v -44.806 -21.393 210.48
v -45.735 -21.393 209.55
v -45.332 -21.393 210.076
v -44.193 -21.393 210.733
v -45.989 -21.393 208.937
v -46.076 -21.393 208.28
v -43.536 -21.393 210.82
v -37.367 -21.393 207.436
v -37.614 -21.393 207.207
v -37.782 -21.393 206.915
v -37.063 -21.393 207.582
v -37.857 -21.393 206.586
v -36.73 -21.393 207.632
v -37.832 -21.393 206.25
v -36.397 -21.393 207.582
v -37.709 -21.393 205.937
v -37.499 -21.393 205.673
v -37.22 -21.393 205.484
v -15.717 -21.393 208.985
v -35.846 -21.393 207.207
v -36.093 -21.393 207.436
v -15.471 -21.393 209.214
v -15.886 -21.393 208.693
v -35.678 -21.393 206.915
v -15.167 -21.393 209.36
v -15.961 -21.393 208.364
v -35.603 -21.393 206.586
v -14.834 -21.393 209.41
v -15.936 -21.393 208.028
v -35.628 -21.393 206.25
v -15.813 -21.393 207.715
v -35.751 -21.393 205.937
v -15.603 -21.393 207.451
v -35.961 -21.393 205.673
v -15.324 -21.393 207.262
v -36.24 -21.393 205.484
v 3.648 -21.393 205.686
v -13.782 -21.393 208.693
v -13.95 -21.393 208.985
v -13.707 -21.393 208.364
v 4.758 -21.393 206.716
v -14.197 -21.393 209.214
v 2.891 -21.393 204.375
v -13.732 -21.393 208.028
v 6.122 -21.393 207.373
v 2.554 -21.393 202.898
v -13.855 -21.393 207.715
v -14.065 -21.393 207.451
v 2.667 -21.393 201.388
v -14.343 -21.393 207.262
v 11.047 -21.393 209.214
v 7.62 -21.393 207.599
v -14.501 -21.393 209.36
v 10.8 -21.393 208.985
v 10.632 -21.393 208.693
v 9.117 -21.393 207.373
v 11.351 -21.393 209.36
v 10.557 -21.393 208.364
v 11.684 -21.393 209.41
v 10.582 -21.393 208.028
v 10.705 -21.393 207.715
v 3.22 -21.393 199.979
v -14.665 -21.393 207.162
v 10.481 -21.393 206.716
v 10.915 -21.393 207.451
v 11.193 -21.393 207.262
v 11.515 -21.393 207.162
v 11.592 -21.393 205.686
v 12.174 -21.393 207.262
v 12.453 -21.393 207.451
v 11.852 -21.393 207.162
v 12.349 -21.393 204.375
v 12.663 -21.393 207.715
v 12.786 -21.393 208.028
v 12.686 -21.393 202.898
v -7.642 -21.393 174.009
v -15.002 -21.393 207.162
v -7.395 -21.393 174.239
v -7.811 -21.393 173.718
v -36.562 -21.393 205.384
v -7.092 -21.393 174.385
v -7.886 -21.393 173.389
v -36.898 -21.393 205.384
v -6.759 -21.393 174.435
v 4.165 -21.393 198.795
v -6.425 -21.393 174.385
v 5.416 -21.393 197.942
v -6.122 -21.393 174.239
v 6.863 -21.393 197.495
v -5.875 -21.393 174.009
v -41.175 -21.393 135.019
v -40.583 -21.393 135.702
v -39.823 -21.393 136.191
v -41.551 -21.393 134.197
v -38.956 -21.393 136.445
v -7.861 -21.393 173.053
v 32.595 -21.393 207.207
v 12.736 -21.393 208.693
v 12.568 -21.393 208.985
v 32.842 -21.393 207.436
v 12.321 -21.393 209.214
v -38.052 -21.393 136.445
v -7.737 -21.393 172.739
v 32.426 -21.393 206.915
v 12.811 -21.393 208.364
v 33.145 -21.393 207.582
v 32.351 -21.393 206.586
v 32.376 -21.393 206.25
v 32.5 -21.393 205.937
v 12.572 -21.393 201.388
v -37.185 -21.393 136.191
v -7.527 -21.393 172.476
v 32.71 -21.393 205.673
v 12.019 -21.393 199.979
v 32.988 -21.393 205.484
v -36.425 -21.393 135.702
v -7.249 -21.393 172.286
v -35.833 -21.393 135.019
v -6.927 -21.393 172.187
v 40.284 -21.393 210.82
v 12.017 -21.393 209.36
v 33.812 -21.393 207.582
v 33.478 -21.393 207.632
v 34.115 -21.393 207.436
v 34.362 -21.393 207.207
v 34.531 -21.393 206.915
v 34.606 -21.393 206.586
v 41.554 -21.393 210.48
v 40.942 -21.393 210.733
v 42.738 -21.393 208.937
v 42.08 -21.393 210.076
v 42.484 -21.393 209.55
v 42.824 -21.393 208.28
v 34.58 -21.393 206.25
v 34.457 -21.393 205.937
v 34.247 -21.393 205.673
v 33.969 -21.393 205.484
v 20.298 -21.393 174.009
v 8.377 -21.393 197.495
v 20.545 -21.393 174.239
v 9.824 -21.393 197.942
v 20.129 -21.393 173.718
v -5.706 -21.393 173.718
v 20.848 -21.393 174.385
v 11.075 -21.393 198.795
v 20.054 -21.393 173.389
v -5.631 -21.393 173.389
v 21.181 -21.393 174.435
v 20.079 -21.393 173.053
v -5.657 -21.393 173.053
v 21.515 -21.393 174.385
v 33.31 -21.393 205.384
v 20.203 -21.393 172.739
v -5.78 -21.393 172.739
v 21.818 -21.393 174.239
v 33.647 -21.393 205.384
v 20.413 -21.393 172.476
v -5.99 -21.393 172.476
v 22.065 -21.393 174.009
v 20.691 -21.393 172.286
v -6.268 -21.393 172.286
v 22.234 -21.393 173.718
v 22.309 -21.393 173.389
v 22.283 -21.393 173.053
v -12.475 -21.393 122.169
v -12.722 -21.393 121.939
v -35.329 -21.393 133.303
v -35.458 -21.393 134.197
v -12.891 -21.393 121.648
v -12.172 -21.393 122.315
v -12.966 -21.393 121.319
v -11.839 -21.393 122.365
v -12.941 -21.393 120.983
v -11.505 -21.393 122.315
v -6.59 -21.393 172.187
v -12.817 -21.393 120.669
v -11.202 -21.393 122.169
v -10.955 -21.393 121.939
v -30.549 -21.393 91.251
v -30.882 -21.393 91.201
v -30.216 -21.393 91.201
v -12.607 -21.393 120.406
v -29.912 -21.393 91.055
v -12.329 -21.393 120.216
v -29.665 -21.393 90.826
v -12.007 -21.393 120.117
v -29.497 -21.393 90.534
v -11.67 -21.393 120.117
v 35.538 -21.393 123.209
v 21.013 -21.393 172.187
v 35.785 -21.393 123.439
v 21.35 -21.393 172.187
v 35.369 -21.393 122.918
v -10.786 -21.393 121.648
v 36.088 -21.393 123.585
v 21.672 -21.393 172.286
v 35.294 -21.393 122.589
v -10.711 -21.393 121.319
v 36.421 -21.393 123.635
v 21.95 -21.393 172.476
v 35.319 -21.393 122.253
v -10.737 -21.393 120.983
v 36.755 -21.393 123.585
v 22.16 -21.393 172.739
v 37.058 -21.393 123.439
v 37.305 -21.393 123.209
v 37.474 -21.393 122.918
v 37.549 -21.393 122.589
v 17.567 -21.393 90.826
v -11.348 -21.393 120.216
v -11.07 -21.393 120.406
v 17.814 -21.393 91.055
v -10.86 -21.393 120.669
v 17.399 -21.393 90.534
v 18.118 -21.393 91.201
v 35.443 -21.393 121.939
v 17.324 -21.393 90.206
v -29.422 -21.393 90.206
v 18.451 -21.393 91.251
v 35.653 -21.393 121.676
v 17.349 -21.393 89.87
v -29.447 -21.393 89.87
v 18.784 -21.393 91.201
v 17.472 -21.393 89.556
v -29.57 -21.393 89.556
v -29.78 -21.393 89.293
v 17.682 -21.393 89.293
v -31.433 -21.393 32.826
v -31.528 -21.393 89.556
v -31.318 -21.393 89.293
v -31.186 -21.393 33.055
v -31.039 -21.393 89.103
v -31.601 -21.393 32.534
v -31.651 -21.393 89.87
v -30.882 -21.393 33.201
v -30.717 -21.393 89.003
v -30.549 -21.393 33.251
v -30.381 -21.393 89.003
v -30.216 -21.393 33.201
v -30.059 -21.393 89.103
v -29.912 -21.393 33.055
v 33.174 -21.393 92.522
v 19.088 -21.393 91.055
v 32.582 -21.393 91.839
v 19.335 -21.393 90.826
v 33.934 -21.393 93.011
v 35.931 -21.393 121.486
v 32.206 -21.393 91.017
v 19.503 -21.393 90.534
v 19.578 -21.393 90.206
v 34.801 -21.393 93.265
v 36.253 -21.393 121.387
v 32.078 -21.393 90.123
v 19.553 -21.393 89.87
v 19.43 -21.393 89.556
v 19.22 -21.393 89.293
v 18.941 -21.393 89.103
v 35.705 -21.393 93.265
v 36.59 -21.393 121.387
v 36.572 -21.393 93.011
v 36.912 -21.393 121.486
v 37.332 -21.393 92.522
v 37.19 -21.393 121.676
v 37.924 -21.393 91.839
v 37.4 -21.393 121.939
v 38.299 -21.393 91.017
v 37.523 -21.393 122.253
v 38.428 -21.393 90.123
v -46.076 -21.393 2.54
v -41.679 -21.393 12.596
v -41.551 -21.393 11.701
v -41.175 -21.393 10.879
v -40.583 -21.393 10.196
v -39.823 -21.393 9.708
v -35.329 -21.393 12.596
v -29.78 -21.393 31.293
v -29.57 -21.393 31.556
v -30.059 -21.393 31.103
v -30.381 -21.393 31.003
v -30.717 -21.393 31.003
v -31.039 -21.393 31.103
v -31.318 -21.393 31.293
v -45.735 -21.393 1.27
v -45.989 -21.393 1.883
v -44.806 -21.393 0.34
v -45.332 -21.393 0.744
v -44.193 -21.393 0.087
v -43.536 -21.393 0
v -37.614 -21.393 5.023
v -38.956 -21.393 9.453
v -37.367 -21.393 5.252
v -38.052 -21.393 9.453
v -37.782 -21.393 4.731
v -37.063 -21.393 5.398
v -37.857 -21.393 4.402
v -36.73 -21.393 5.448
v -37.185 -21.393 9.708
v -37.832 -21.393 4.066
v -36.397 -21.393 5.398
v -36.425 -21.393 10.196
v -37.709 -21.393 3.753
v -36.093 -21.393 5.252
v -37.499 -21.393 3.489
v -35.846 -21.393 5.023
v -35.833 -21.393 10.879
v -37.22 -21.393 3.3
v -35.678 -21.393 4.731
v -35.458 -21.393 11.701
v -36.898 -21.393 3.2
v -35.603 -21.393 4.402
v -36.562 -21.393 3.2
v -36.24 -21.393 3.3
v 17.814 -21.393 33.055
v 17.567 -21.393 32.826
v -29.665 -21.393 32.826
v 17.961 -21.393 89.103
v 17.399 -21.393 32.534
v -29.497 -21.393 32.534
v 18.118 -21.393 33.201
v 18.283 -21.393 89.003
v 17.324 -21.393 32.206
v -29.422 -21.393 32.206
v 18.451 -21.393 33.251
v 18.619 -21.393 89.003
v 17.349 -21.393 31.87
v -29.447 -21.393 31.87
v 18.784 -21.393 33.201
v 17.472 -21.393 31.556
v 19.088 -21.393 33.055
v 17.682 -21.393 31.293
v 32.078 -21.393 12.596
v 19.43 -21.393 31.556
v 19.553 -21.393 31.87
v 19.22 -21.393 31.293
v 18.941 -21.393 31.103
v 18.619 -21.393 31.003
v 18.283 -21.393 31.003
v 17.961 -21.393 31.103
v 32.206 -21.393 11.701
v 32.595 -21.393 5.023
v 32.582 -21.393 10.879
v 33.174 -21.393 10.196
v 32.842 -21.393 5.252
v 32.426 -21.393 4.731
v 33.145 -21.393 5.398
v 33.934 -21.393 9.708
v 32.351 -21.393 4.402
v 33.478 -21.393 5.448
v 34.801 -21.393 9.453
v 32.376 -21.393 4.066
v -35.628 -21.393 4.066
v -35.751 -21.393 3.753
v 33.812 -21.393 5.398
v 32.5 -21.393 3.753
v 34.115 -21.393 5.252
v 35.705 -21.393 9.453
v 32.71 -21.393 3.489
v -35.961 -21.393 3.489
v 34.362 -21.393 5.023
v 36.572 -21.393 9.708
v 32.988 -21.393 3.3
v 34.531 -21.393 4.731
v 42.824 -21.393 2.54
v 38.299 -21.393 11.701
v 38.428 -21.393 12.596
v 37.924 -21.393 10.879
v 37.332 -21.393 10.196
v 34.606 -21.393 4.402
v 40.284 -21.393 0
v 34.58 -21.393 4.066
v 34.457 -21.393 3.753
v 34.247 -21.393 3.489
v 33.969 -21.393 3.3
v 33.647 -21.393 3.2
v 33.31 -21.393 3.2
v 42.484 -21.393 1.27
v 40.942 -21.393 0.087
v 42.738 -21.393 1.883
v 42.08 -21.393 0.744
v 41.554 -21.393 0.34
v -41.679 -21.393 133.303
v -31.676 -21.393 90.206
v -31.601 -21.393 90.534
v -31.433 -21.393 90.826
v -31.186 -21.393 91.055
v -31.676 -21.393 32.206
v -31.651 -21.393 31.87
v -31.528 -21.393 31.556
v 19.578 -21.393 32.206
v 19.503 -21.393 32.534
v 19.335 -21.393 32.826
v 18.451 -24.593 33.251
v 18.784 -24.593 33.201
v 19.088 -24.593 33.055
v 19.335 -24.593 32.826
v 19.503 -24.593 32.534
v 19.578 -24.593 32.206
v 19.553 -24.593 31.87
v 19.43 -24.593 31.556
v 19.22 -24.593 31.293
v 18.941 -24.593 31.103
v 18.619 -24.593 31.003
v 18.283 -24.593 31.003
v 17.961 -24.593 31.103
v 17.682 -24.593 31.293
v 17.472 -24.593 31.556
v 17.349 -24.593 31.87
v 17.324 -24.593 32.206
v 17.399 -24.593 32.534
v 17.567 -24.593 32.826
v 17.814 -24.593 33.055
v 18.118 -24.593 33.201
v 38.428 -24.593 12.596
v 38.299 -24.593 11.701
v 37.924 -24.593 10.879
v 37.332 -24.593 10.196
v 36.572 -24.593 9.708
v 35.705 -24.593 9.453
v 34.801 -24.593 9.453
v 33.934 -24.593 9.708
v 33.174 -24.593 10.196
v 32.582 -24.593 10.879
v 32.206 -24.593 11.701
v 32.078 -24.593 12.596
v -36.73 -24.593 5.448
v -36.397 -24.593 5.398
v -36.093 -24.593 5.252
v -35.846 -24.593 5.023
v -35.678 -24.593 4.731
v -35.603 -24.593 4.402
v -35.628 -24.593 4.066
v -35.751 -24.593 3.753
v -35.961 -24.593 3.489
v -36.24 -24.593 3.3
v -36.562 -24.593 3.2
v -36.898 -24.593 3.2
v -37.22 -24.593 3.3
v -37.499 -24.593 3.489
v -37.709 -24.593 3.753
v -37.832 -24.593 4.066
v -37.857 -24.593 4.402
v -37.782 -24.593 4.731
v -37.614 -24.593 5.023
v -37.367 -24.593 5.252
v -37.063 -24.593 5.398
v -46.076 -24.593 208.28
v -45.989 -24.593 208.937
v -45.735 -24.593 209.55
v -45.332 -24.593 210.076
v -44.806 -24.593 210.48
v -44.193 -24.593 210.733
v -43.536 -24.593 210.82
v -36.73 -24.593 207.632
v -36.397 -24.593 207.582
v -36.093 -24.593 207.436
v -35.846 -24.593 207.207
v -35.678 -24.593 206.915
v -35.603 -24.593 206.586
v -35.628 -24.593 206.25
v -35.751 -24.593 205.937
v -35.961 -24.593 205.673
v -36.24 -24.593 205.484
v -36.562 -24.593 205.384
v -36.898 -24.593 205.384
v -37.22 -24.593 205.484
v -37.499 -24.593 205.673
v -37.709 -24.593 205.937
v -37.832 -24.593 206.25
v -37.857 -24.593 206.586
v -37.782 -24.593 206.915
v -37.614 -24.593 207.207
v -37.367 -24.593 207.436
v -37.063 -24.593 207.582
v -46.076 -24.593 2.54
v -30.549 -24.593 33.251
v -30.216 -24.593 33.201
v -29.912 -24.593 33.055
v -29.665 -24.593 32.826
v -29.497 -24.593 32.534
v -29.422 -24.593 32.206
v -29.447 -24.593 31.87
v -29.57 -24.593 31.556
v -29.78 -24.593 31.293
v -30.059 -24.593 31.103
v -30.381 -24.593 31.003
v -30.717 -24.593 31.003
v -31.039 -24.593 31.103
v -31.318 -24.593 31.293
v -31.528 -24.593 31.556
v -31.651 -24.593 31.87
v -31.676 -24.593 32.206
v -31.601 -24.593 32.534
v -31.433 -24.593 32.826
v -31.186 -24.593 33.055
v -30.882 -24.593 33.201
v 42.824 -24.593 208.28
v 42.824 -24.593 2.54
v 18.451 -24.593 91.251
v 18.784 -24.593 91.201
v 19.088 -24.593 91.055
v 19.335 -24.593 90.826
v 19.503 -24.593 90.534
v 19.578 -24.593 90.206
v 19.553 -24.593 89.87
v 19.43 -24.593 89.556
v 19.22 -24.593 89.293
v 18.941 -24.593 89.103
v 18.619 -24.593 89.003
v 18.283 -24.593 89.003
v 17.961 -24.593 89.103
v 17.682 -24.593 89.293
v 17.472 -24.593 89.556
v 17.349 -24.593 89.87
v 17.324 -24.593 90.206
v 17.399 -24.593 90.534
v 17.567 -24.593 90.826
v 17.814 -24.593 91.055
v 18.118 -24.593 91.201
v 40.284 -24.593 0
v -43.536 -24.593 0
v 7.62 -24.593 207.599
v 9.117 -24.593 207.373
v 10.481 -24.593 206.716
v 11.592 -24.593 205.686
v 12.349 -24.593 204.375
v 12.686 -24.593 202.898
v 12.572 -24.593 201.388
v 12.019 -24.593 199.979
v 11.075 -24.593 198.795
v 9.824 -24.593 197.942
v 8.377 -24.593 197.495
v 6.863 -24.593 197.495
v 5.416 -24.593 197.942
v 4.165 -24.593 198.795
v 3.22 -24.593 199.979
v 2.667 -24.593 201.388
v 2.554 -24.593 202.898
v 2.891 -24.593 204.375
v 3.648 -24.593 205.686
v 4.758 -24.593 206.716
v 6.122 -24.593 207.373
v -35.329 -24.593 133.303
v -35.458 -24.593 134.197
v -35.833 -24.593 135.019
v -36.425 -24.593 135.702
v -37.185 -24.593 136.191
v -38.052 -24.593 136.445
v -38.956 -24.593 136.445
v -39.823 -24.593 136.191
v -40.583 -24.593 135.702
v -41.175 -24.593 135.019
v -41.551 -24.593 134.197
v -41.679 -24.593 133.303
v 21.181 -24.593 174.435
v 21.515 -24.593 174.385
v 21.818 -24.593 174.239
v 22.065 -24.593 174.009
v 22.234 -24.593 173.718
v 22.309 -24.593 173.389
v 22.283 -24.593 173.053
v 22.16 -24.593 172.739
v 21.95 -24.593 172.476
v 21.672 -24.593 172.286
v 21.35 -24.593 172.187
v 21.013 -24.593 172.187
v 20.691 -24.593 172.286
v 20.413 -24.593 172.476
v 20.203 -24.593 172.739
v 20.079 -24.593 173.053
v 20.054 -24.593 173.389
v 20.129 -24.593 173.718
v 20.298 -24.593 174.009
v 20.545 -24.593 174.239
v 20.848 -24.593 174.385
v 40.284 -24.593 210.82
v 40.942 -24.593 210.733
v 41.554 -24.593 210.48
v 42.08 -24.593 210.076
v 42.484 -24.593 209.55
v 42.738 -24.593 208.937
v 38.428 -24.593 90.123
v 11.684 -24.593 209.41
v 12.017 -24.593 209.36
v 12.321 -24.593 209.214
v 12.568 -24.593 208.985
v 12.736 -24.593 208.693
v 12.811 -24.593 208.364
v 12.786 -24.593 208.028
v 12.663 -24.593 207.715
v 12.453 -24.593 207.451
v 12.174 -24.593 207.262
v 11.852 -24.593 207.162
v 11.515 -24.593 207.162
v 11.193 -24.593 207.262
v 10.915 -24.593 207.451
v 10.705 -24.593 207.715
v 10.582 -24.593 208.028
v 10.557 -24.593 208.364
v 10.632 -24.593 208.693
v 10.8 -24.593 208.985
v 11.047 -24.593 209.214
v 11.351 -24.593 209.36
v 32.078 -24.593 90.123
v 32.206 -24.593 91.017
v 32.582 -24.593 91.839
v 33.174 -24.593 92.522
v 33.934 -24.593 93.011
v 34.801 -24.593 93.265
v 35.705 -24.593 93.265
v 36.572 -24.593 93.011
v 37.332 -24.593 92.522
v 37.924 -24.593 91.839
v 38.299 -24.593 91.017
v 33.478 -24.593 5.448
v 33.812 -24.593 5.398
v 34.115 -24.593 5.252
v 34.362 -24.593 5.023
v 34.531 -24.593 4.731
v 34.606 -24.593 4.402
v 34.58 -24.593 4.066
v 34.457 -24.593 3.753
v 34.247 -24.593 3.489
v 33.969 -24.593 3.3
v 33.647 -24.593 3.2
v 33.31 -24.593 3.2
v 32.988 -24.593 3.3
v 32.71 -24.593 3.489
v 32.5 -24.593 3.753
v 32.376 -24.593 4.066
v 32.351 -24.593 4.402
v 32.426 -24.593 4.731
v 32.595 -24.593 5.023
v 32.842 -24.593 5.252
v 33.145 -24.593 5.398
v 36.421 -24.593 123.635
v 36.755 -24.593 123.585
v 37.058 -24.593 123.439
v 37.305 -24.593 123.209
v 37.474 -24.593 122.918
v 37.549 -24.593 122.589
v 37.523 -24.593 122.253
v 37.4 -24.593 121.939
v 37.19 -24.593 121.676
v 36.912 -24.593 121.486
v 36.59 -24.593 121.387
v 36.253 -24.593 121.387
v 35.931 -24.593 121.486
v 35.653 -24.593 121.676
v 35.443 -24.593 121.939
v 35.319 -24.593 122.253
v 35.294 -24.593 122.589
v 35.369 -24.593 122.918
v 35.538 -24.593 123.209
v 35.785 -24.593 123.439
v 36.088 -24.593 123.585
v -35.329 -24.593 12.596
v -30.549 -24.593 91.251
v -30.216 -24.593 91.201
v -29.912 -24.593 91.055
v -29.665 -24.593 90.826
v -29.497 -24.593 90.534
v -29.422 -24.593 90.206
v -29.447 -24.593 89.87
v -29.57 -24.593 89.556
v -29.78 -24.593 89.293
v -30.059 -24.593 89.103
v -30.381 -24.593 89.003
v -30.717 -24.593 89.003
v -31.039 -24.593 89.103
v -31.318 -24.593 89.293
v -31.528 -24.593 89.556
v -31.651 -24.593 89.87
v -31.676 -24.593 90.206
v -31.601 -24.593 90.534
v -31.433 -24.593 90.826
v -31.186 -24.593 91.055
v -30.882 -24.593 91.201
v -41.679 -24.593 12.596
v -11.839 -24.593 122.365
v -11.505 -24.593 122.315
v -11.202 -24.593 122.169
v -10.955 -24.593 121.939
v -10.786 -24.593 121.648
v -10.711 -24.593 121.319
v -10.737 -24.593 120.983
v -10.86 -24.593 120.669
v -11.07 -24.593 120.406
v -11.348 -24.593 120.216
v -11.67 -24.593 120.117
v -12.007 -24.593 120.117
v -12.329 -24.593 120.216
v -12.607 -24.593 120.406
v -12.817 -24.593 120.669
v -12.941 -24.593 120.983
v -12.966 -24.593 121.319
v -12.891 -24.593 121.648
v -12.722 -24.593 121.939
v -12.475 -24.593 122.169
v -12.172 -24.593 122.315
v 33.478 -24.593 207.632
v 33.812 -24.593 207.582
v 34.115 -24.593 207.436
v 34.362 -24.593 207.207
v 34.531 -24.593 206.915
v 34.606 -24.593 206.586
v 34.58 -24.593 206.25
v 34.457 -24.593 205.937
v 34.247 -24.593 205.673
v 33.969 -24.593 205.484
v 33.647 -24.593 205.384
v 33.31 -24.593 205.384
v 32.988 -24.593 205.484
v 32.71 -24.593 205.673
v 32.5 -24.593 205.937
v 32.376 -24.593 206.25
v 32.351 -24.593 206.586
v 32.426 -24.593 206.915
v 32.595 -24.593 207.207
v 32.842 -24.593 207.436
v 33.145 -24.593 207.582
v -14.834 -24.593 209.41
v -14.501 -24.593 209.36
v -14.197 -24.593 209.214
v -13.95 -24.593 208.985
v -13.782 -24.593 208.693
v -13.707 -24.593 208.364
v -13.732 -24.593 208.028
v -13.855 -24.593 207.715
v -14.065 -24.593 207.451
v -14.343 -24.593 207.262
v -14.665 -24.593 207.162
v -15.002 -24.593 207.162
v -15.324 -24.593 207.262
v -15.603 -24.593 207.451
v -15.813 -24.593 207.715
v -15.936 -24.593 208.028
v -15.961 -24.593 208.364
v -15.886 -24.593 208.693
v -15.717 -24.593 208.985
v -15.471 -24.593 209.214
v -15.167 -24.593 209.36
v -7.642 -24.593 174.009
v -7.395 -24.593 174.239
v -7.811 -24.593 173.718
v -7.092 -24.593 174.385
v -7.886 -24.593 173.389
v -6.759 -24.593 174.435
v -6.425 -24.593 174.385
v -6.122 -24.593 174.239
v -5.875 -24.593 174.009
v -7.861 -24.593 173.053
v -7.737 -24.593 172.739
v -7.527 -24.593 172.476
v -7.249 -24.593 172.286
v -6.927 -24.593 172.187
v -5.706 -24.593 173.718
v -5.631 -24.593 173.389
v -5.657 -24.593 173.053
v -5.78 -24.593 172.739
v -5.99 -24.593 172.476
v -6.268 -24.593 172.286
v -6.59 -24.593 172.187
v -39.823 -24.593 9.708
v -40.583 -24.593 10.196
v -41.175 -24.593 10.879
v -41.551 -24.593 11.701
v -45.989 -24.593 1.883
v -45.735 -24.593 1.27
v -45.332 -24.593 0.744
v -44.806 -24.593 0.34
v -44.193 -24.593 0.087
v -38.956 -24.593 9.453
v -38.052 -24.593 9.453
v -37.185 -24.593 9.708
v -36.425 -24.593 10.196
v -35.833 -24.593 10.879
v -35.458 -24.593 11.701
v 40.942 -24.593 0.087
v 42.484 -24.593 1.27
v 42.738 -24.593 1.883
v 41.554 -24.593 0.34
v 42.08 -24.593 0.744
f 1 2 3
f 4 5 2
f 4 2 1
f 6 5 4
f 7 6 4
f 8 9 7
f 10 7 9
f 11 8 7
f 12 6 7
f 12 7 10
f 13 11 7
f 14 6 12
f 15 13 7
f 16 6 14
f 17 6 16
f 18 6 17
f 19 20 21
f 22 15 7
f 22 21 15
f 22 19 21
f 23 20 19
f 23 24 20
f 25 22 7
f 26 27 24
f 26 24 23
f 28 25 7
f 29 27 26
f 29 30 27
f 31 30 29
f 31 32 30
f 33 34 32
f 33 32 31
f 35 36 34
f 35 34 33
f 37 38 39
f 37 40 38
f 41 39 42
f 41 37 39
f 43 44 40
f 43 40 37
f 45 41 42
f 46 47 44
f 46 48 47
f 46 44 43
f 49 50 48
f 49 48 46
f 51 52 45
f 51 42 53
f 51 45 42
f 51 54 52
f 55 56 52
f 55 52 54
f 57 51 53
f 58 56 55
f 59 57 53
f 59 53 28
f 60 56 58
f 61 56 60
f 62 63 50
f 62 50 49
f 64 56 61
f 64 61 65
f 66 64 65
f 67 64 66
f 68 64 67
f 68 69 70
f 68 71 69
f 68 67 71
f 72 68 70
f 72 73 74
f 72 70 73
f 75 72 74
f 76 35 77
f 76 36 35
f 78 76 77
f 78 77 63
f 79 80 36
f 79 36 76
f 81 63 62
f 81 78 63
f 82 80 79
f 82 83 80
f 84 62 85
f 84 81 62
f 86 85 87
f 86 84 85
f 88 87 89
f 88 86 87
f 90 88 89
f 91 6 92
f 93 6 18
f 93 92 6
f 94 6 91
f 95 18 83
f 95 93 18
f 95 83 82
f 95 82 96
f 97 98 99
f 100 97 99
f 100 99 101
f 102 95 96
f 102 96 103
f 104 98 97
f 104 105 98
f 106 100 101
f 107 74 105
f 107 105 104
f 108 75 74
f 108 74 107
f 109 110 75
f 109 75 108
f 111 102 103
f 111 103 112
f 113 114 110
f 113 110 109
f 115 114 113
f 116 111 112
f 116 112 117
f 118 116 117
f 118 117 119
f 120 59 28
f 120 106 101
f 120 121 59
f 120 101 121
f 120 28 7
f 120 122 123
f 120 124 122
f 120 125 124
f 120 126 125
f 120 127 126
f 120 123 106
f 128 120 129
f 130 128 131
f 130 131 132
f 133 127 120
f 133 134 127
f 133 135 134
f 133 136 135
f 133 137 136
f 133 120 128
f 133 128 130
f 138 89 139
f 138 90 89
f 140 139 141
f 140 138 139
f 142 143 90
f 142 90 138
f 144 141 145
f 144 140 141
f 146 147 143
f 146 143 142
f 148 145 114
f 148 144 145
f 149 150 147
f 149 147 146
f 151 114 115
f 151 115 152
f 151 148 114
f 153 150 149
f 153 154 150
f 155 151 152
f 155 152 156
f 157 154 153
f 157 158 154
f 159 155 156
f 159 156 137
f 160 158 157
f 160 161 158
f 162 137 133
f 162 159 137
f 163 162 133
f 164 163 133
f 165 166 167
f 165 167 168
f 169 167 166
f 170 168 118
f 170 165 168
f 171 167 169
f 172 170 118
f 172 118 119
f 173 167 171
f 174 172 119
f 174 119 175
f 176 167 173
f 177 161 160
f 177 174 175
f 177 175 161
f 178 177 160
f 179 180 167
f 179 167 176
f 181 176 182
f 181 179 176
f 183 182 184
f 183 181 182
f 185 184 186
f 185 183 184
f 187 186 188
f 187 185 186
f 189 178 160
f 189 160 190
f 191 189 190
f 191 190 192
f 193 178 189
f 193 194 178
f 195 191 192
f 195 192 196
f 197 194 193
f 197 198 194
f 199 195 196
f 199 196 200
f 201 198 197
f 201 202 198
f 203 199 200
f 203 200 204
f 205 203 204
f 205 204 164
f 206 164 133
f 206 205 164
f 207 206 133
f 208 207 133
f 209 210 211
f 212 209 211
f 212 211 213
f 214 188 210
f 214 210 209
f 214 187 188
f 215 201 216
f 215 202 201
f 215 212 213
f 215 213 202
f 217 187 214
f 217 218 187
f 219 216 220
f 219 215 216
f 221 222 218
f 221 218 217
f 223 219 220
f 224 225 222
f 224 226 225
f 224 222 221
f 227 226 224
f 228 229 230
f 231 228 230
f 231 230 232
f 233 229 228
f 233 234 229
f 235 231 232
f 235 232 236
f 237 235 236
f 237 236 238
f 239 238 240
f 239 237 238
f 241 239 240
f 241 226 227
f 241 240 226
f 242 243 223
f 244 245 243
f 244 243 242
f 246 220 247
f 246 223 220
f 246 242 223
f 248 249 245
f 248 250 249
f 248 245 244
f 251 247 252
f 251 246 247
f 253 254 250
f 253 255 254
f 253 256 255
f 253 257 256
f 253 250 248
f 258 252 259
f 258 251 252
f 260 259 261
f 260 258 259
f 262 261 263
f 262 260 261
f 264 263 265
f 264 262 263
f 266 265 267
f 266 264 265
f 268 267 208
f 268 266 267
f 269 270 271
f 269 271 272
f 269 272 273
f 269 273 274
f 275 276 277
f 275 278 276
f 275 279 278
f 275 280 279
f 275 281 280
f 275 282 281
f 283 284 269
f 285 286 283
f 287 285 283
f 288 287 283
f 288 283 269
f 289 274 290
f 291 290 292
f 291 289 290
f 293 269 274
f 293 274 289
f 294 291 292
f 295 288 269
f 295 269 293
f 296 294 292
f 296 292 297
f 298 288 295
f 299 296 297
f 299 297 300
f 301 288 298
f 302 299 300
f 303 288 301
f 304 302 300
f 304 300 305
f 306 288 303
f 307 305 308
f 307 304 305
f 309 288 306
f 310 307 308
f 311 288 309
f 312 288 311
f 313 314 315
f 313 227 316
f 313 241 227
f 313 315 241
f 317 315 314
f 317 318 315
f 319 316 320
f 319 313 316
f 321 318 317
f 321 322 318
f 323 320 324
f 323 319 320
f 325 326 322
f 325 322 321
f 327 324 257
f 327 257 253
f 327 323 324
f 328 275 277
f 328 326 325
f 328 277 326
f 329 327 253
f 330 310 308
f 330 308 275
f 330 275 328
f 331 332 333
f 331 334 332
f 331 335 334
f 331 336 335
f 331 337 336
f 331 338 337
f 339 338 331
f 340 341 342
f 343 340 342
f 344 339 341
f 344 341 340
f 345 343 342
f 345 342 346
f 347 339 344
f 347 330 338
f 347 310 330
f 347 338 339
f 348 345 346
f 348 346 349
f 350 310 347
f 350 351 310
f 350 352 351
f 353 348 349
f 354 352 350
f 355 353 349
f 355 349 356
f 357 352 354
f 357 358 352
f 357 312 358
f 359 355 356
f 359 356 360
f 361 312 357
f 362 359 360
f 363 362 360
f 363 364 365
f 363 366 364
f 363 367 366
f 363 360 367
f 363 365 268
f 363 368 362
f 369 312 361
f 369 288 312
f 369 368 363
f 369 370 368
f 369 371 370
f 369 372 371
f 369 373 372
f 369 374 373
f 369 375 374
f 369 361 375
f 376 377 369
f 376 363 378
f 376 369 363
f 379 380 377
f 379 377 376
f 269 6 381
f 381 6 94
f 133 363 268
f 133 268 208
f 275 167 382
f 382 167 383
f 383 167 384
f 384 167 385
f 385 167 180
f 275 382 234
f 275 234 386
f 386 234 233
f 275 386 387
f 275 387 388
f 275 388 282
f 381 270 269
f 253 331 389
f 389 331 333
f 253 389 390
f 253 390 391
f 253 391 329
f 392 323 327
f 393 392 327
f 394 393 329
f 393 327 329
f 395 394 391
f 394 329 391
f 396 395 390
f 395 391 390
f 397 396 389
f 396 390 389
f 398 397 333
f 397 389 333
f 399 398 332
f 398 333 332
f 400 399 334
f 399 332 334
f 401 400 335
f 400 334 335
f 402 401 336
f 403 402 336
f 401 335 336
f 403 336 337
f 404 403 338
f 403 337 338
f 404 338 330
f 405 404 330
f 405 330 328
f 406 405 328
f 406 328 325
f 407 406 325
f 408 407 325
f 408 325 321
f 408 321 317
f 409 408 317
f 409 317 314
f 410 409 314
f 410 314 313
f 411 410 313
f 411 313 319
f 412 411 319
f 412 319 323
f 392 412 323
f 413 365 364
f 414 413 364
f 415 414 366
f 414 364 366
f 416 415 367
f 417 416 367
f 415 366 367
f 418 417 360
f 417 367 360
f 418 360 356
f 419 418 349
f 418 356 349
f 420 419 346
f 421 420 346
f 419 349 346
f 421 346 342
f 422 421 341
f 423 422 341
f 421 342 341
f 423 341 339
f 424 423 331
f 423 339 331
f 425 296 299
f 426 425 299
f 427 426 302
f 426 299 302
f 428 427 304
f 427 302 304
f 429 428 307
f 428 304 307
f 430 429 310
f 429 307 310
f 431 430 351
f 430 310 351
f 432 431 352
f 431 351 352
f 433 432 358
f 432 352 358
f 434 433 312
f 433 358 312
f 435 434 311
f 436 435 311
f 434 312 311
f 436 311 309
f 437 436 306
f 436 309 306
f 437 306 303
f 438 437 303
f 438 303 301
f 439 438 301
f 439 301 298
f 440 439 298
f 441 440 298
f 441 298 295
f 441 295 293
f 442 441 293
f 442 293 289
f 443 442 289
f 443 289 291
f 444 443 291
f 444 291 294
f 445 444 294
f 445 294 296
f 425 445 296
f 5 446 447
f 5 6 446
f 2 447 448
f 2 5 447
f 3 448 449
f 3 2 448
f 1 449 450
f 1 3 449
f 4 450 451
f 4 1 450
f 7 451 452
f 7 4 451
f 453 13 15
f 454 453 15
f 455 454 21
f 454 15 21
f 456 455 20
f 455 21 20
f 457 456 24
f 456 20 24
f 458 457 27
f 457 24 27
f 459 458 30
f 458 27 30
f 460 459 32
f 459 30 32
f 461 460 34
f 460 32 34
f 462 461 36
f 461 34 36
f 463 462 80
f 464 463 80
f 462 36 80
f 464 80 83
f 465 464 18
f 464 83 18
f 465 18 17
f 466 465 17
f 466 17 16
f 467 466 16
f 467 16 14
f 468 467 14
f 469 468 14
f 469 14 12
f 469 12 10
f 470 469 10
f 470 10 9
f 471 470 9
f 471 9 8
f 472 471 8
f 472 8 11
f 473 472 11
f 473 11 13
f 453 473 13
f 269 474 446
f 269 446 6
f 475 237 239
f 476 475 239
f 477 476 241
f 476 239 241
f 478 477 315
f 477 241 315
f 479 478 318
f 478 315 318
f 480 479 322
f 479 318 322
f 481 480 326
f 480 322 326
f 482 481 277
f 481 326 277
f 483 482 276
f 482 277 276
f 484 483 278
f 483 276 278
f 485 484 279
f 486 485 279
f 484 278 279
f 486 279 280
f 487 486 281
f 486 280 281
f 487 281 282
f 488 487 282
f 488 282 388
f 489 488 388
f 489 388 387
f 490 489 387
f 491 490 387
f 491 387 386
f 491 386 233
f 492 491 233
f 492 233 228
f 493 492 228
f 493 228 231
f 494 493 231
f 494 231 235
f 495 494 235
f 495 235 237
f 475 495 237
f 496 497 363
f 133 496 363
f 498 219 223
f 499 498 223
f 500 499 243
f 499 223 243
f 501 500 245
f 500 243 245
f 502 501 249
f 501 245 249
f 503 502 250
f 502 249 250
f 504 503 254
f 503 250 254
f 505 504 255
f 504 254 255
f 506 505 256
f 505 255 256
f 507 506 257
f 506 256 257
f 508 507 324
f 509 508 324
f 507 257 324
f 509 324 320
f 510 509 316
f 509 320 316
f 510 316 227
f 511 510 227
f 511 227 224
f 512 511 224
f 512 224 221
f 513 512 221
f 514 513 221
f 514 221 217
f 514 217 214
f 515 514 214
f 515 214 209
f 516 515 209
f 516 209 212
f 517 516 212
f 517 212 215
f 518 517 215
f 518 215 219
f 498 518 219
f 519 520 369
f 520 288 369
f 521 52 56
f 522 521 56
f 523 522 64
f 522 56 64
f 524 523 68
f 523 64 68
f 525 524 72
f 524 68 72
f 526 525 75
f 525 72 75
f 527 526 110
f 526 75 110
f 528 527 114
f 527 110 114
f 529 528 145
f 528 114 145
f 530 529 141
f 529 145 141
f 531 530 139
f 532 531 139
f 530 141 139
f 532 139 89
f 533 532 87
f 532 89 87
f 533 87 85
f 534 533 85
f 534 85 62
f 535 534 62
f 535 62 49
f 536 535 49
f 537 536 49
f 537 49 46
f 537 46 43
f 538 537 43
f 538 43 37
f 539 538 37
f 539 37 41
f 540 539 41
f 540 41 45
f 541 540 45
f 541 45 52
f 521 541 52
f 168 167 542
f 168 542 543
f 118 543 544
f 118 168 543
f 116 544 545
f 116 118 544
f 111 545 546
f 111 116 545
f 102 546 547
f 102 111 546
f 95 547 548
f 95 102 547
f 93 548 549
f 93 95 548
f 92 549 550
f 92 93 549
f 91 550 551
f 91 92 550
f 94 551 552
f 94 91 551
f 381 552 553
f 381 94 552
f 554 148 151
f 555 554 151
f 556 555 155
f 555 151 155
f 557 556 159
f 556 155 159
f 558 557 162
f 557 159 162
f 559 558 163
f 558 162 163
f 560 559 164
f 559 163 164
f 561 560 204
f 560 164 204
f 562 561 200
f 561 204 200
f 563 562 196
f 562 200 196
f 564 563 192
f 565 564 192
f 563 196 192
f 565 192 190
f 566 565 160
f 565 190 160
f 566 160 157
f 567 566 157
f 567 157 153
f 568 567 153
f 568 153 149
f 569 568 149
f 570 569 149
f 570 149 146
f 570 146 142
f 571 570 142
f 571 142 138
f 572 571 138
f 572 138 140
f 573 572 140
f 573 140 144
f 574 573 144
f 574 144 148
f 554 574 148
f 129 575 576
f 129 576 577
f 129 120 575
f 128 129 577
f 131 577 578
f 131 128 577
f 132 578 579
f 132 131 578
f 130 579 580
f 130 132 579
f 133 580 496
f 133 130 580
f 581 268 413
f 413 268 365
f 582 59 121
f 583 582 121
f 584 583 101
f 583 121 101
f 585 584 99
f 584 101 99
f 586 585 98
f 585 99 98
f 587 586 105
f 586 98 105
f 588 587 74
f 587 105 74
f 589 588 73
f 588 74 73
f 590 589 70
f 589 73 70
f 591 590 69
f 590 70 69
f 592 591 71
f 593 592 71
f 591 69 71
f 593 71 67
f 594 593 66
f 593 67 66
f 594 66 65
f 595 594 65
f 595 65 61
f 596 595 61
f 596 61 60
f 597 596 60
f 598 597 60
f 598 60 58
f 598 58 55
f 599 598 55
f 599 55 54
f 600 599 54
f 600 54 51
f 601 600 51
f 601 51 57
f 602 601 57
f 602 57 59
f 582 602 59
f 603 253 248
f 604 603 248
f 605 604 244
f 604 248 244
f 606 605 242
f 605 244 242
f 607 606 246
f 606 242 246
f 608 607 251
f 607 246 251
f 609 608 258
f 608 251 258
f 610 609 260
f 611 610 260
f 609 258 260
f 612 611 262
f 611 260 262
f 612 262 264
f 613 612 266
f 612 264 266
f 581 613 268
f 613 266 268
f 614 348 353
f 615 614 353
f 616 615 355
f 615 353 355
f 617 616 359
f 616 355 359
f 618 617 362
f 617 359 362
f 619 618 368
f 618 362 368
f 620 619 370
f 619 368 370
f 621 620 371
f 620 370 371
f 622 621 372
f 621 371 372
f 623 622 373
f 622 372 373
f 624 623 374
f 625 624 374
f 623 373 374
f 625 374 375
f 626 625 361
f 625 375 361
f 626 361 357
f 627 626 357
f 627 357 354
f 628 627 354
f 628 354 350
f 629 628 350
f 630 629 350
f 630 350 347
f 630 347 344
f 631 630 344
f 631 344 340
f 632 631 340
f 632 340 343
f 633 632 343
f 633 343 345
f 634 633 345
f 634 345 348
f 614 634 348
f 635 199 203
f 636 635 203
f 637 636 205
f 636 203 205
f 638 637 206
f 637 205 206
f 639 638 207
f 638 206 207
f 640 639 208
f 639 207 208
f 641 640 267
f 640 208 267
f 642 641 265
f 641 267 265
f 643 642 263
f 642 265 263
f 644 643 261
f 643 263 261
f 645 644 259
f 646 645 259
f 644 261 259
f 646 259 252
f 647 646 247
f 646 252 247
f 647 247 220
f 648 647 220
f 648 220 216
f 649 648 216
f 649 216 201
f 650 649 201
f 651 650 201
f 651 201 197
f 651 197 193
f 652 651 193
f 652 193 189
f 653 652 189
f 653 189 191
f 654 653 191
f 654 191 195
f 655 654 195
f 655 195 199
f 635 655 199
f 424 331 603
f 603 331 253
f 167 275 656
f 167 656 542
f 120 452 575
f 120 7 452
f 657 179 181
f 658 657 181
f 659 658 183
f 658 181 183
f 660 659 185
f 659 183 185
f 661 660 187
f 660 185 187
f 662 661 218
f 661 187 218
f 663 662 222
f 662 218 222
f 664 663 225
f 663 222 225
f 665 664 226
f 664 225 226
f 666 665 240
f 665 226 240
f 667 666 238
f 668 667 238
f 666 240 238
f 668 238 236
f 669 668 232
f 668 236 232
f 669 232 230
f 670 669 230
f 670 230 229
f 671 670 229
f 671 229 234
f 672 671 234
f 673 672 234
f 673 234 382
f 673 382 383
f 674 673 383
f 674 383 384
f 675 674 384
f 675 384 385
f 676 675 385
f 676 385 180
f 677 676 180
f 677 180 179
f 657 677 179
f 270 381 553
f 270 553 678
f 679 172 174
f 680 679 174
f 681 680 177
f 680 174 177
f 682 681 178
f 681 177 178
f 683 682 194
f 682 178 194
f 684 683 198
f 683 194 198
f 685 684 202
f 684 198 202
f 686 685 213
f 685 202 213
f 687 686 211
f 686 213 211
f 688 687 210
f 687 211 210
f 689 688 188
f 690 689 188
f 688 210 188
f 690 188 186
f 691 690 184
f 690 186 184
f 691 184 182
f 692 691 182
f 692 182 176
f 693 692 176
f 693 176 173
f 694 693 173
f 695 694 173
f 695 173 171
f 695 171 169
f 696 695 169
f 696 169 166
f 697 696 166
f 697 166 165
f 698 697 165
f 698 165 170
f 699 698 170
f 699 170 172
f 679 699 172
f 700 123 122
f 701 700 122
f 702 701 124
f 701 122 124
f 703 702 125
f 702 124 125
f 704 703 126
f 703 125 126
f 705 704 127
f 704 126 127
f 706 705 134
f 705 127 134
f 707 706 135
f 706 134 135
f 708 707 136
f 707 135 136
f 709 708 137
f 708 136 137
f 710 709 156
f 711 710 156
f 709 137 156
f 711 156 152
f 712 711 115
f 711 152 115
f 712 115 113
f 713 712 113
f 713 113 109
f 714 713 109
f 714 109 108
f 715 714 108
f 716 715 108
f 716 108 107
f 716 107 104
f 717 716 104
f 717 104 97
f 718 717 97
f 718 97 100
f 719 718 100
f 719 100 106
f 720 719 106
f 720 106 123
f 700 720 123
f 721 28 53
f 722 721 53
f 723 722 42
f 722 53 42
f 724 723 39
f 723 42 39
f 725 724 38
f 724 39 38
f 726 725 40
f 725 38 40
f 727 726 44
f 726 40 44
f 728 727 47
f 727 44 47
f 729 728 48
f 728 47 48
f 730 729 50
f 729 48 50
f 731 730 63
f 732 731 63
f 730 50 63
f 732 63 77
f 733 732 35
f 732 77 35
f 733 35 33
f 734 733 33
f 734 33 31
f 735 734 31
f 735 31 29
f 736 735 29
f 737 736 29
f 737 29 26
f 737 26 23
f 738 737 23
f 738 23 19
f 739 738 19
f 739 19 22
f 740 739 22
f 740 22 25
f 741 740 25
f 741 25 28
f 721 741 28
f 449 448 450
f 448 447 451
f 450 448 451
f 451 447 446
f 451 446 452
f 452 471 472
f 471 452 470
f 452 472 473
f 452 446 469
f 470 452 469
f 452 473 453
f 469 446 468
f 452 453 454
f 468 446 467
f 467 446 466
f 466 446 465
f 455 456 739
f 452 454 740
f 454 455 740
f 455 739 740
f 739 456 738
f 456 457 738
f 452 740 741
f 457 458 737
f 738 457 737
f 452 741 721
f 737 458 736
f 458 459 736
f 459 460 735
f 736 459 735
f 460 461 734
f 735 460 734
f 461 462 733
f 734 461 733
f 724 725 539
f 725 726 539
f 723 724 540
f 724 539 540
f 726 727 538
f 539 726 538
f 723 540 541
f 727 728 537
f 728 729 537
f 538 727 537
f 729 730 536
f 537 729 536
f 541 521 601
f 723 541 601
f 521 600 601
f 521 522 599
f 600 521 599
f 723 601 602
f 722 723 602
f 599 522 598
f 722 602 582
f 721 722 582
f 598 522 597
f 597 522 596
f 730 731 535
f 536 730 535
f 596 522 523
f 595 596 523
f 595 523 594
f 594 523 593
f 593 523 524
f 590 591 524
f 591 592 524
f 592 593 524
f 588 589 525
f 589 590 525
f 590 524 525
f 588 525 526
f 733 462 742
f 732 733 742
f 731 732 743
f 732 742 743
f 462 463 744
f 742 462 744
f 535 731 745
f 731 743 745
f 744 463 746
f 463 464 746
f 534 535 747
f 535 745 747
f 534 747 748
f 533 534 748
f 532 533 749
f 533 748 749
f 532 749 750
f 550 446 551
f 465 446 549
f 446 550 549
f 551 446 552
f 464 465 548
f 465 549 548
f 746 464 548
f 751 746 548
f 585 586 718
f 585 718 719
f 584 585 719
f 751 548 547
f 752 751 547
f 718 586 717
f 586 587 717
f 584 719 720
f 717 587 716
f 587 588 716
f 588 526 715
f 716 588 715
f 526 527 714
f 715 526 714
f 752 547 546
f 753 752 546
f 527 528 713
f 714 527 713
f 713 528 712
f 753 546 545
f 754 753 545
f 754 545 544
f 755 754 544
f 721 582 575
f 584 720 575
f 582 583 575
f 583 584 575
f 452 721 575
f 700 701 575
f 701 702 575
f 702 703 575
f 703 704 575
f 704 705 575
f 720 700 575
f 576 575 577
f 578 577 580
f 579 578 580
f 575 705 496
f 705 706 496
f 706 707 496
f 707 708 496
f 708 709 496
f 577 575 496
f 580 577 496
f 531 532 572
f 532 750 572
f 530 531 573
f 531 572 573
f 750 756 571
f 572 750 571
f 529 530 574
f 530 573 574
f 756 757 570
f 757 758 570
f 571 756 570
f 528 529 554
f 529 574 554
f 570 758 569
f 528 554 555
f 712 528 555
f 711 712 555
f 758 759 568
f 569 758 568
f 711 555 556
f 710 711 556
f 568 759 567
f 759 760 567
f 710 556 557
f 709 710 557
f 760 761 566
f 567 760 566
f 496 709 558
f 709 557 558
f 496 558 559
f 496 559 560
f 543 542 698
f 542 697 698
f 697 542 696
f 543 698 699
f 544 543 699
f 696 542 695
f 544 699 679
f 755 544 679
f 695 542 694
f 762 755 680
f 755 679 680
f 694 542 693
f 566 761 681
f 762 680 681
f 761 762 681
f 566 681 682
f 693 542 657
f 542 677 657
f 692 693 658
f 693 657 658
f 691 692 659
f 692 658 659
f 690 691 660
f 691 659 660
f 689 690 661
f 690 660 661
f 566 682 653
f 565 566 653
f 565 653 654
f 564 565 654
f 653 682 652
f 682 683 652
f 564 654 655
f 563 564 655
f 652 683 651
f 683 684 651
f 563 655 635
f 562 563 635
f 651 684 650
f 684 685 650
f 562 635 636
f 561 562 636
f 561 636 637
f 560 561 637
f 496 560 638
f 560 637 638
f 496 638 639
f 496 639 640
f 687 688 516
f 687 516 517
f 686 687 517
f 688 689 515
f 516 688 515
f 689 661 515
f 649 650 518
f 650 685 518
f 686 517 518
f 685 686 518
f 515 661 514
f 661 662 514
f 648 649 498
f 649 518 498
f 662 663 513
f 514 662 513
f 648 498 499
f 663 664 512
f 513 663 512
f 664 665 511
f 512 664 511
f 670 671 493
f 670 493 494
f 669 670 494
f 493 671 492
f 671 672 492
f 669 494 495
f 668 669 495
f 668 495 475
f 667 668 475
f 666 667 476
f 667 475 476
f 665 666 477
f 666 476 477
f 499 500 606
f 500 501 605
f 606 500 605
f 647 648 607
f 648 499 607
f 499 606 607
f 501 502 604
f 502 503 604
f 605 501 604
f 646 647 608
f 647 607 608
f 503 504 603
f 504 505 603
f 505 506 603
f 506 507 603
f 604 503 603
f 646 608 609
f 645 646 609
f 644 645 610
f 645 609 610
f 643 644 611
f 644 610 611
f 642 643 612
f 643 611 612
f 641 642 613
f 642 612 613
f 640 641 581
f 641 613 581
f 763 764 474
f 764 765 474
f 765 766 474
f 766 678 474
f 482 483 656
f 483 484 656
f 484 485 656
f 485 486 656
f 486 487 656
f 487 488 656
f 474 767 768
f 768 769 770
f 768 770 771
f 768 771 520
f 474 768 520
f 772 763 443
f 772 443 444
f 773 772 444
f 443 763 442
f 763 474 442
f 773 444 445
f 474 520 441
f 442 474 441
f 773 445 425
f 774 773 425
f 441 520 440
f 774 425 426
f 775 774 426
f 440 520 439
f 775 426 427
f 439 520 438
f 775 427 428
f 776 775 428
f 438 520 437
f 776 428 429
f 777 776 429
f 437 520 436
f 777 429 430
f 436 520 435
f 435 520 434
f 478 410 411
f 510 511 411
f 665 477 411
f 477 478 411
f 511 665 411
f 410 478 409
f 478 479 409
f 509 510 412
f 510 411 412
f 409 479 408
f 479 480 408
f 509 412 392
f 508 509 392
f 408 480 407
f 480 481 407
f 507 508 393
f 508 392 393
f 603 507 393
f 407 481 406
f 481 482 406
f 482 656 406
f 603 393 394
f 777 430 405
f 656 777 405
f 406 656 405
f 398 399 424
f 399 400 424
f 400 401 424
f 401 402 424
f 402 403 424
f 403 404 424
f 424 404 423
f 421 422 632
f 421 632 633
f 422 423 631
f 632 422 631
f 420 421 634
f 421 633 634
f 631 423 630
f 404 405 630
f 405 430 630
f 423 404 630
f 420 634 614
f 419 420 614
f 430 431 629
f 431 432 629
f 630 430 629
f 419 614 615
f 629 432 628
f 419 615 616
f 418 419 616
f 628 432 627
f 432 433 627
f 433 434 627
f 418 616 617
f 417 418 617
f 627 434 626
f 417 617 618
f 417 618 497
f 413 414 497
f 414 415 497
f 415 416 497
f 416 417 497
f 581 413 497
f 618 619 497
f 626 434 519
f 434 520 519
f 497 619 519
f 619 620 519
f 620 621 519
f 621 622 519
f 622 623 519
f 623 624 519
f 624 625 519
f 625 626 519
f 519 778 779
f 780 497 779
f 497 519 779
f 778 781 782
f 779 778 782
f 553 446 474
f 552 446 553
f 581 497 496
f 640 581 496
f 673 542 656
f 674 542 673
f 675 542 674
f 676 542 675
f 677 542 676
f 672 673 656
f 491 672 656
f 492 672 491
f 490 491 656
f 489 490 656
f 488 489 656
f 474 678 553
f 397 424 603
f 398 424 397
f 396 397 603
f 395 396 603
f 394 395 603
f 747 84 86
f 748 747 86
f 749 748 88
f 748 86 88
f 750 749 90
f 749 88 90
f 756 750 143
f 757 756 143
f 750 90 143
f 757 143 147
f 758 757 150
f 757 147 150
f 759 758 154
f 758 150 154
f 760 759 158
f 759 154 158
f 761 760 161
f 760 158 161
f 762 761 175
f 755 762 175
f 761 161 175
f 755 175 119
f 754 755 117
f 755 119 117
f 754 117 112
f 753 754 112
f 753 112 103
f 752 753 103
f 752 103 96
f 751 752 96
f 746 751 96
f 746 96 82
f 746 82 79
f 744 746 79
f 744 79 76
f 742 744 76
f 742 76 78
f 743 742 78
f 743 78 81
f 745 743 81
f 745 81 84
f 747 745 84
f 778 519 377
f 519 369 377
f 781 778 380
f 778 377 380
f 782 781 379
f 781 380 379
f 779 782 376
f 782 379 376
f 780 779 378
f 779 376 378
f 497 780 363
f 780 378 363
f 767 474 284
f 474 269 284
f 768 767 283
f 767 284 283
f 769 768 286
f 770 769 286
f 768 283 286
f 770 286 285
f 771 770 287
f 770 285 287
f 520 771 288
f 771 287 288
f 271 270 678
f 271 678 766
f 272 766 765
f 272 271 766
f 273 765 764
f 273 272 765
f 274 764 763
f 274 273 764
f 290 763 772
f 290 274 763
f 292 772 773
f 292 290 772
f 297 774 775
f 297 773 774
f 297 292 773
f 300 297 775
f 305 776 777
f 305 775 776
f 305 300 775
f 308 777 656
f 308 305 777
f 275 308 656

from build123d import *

# Parameters (mm, degrees)
SKETCH2_W           = 88.9
SKETCH2_H           = 3.2004
BOSS_EXTRUDE1_DEPTH = 210.82
SKETCH3_R           = 1.1303
SKETCH3_R_2         = 5.08
CUT_EXTRUDE1_DEPTH  = 216.82004684
FILLET2_R           = 2.54


with BuildPart() as part:
    # Sketch2 → Boss-Extrude1 (new body)
    with BuildSketch(Plane.XY):
        with Locations((-1.625781684, -22.993244248)):
            Rectangle(SKETCH2_W, SKETCH2_H)
    extrude(amount=BOSS_EXTRUDE1_DEPTH)

    # Sketch3 → Cut-Extrude1 (cut, through all)
    with BuildSketch(Plane(origin=(0, -21.393044248, 0), x_dir=(-1, 0, 0), z_dir=(0, 1, 0))):
        with Locations(Location((14.833781684, 208.28, 0), (0, 0, 90))):
            Circle(SKETCH3_R)
        with Locations(Location((-11.683818316, 208.28, 0), (0, 0, 90))):
            Circle(SKETCH3_R)
        with Locations(Location((-7.619818316, 202.518755316, 0), (0, 0, 90))):
            Circle(SKETCH3_R_2)
        with Locations(Location((-33.478453416, 206.502, 0), (0, 0, 90))):
            Circle(SKETCH3_R)
        with Locations(Location((36.730016784, 206.502, 0), (0, 0, 90))):
            Circle(SKETCH3_R)
        with Locations(Location((-33.478453416, 4.318, 0), (0, 0, 90))):
            Circle(SKETCH3_R)
        with Locations(Location((36.730016784, 4.318, 0), (0, 0, 90))):
            Circle(SKETCH3_R)
        with Locations(Location((-18.450986138, 32.12110162, 0), (0, 0, 90))):
            Circle(SKETCH3_R)
        with Locations(Location((-18.450986138, 90.12110162, 0), (0, 0, 90))):
            Circle(SKETCH3_R)
        with Locations(Location((30.549013862, 90.12110162, 0), (0, 0, 90))):
            Circle(SKETCH3_R)
        with Locations(Location((30.549013862, 32.12110162, 0), (0, 0, 90))):
            Circle(SKETCH3_R)
        with Locations(Location((-21.181379204, 173.304632562, 0), (0, 0, 90))):
            Circle(SKETCH3_R)
        with Locations(Location((-36.421379204, 122.504632562, 0), (0, 0, 90))):
            Circle(SKETCH3_R)
        with Locations(Location((6.758620796, 173.304632562, 0), (0, 0, 90))):
            Circle(SKETCH3_R)
        with Locations(Location((11.838620796, 121.234632562, 0), (0, 0, 90))):
            Circle(SKETCH3_R)
        with Locations((81.579081393, -113.266782514)):
            Circle(SKETCH3_R)
        with Locations((66.769810529, -163.717742064)):
            Circle(SKETCH3_R)
        with Locations((108.318194793, -113.266782514)):
            Circle(SKETCH3_R)
        with Locations((97.604440284, -108.476314785)):
            Circle(SKETCH3_R)
        with Locations((82.79516942, -158.927274335)):
            Circle(SKETCH3_R)
        with Locations((124.343553684, -108.476314785)):
            Circle(SKETCH3_R)
        with Locations((112.789811005, -158.927274335)):
            Circle(SKETCH3_R)
        with BuildLine():
            Line((35.32929924, 12.595958552), (35.32929924, 133.302587666))
            ThreePointArc((35.32929924, 133.302587666), (38.50429924, 136.477587666), (41.67929924, 133.302587666))
            Line((41.67929924, 133.302587666), (41.67929924, 12.595958552))
            ThreePointArc((41.67929924, 12.595958552), (38.50429924, 9.420958552), (35.32929924, 12.595958552))
        make_face()
        with BuildLine():
            Line((-32.077737936, 12.595958552), (-32.077737936, 90.122587598))
            ThreePointArc((-32.077737936, 90.122587598), (-35.252737936, 93.297587598), (-38.427737936, 90.122587598))
            Line((-38.427737936, 90.122587598), (-38.427737936, 12.595958552))
            ThreePointArc((-38.427737936, 12.595958552), (-35.252737936, 9.420958552), (-32.077737936, 12.595958552))
        make_face()
    extrude(amount=-CUT_EXTRUDE1_DEPTH, mode=Mode.SUBTRACT)

    # Fillet2
    fillet2_edges = [part.edges().sort_by_distance(p)[0] for p in [
        (42.824218316, -22.993244248, 210.82),
        (-46.075781684, -22.993244248, 210.82),
        (42.824218316, -22.993244248, 0),
        (-46.075781684, -22.993244248, 0),
    ]]
    fillet(fillet2_edges, radius=FILLET2_R)


solid = part.part
